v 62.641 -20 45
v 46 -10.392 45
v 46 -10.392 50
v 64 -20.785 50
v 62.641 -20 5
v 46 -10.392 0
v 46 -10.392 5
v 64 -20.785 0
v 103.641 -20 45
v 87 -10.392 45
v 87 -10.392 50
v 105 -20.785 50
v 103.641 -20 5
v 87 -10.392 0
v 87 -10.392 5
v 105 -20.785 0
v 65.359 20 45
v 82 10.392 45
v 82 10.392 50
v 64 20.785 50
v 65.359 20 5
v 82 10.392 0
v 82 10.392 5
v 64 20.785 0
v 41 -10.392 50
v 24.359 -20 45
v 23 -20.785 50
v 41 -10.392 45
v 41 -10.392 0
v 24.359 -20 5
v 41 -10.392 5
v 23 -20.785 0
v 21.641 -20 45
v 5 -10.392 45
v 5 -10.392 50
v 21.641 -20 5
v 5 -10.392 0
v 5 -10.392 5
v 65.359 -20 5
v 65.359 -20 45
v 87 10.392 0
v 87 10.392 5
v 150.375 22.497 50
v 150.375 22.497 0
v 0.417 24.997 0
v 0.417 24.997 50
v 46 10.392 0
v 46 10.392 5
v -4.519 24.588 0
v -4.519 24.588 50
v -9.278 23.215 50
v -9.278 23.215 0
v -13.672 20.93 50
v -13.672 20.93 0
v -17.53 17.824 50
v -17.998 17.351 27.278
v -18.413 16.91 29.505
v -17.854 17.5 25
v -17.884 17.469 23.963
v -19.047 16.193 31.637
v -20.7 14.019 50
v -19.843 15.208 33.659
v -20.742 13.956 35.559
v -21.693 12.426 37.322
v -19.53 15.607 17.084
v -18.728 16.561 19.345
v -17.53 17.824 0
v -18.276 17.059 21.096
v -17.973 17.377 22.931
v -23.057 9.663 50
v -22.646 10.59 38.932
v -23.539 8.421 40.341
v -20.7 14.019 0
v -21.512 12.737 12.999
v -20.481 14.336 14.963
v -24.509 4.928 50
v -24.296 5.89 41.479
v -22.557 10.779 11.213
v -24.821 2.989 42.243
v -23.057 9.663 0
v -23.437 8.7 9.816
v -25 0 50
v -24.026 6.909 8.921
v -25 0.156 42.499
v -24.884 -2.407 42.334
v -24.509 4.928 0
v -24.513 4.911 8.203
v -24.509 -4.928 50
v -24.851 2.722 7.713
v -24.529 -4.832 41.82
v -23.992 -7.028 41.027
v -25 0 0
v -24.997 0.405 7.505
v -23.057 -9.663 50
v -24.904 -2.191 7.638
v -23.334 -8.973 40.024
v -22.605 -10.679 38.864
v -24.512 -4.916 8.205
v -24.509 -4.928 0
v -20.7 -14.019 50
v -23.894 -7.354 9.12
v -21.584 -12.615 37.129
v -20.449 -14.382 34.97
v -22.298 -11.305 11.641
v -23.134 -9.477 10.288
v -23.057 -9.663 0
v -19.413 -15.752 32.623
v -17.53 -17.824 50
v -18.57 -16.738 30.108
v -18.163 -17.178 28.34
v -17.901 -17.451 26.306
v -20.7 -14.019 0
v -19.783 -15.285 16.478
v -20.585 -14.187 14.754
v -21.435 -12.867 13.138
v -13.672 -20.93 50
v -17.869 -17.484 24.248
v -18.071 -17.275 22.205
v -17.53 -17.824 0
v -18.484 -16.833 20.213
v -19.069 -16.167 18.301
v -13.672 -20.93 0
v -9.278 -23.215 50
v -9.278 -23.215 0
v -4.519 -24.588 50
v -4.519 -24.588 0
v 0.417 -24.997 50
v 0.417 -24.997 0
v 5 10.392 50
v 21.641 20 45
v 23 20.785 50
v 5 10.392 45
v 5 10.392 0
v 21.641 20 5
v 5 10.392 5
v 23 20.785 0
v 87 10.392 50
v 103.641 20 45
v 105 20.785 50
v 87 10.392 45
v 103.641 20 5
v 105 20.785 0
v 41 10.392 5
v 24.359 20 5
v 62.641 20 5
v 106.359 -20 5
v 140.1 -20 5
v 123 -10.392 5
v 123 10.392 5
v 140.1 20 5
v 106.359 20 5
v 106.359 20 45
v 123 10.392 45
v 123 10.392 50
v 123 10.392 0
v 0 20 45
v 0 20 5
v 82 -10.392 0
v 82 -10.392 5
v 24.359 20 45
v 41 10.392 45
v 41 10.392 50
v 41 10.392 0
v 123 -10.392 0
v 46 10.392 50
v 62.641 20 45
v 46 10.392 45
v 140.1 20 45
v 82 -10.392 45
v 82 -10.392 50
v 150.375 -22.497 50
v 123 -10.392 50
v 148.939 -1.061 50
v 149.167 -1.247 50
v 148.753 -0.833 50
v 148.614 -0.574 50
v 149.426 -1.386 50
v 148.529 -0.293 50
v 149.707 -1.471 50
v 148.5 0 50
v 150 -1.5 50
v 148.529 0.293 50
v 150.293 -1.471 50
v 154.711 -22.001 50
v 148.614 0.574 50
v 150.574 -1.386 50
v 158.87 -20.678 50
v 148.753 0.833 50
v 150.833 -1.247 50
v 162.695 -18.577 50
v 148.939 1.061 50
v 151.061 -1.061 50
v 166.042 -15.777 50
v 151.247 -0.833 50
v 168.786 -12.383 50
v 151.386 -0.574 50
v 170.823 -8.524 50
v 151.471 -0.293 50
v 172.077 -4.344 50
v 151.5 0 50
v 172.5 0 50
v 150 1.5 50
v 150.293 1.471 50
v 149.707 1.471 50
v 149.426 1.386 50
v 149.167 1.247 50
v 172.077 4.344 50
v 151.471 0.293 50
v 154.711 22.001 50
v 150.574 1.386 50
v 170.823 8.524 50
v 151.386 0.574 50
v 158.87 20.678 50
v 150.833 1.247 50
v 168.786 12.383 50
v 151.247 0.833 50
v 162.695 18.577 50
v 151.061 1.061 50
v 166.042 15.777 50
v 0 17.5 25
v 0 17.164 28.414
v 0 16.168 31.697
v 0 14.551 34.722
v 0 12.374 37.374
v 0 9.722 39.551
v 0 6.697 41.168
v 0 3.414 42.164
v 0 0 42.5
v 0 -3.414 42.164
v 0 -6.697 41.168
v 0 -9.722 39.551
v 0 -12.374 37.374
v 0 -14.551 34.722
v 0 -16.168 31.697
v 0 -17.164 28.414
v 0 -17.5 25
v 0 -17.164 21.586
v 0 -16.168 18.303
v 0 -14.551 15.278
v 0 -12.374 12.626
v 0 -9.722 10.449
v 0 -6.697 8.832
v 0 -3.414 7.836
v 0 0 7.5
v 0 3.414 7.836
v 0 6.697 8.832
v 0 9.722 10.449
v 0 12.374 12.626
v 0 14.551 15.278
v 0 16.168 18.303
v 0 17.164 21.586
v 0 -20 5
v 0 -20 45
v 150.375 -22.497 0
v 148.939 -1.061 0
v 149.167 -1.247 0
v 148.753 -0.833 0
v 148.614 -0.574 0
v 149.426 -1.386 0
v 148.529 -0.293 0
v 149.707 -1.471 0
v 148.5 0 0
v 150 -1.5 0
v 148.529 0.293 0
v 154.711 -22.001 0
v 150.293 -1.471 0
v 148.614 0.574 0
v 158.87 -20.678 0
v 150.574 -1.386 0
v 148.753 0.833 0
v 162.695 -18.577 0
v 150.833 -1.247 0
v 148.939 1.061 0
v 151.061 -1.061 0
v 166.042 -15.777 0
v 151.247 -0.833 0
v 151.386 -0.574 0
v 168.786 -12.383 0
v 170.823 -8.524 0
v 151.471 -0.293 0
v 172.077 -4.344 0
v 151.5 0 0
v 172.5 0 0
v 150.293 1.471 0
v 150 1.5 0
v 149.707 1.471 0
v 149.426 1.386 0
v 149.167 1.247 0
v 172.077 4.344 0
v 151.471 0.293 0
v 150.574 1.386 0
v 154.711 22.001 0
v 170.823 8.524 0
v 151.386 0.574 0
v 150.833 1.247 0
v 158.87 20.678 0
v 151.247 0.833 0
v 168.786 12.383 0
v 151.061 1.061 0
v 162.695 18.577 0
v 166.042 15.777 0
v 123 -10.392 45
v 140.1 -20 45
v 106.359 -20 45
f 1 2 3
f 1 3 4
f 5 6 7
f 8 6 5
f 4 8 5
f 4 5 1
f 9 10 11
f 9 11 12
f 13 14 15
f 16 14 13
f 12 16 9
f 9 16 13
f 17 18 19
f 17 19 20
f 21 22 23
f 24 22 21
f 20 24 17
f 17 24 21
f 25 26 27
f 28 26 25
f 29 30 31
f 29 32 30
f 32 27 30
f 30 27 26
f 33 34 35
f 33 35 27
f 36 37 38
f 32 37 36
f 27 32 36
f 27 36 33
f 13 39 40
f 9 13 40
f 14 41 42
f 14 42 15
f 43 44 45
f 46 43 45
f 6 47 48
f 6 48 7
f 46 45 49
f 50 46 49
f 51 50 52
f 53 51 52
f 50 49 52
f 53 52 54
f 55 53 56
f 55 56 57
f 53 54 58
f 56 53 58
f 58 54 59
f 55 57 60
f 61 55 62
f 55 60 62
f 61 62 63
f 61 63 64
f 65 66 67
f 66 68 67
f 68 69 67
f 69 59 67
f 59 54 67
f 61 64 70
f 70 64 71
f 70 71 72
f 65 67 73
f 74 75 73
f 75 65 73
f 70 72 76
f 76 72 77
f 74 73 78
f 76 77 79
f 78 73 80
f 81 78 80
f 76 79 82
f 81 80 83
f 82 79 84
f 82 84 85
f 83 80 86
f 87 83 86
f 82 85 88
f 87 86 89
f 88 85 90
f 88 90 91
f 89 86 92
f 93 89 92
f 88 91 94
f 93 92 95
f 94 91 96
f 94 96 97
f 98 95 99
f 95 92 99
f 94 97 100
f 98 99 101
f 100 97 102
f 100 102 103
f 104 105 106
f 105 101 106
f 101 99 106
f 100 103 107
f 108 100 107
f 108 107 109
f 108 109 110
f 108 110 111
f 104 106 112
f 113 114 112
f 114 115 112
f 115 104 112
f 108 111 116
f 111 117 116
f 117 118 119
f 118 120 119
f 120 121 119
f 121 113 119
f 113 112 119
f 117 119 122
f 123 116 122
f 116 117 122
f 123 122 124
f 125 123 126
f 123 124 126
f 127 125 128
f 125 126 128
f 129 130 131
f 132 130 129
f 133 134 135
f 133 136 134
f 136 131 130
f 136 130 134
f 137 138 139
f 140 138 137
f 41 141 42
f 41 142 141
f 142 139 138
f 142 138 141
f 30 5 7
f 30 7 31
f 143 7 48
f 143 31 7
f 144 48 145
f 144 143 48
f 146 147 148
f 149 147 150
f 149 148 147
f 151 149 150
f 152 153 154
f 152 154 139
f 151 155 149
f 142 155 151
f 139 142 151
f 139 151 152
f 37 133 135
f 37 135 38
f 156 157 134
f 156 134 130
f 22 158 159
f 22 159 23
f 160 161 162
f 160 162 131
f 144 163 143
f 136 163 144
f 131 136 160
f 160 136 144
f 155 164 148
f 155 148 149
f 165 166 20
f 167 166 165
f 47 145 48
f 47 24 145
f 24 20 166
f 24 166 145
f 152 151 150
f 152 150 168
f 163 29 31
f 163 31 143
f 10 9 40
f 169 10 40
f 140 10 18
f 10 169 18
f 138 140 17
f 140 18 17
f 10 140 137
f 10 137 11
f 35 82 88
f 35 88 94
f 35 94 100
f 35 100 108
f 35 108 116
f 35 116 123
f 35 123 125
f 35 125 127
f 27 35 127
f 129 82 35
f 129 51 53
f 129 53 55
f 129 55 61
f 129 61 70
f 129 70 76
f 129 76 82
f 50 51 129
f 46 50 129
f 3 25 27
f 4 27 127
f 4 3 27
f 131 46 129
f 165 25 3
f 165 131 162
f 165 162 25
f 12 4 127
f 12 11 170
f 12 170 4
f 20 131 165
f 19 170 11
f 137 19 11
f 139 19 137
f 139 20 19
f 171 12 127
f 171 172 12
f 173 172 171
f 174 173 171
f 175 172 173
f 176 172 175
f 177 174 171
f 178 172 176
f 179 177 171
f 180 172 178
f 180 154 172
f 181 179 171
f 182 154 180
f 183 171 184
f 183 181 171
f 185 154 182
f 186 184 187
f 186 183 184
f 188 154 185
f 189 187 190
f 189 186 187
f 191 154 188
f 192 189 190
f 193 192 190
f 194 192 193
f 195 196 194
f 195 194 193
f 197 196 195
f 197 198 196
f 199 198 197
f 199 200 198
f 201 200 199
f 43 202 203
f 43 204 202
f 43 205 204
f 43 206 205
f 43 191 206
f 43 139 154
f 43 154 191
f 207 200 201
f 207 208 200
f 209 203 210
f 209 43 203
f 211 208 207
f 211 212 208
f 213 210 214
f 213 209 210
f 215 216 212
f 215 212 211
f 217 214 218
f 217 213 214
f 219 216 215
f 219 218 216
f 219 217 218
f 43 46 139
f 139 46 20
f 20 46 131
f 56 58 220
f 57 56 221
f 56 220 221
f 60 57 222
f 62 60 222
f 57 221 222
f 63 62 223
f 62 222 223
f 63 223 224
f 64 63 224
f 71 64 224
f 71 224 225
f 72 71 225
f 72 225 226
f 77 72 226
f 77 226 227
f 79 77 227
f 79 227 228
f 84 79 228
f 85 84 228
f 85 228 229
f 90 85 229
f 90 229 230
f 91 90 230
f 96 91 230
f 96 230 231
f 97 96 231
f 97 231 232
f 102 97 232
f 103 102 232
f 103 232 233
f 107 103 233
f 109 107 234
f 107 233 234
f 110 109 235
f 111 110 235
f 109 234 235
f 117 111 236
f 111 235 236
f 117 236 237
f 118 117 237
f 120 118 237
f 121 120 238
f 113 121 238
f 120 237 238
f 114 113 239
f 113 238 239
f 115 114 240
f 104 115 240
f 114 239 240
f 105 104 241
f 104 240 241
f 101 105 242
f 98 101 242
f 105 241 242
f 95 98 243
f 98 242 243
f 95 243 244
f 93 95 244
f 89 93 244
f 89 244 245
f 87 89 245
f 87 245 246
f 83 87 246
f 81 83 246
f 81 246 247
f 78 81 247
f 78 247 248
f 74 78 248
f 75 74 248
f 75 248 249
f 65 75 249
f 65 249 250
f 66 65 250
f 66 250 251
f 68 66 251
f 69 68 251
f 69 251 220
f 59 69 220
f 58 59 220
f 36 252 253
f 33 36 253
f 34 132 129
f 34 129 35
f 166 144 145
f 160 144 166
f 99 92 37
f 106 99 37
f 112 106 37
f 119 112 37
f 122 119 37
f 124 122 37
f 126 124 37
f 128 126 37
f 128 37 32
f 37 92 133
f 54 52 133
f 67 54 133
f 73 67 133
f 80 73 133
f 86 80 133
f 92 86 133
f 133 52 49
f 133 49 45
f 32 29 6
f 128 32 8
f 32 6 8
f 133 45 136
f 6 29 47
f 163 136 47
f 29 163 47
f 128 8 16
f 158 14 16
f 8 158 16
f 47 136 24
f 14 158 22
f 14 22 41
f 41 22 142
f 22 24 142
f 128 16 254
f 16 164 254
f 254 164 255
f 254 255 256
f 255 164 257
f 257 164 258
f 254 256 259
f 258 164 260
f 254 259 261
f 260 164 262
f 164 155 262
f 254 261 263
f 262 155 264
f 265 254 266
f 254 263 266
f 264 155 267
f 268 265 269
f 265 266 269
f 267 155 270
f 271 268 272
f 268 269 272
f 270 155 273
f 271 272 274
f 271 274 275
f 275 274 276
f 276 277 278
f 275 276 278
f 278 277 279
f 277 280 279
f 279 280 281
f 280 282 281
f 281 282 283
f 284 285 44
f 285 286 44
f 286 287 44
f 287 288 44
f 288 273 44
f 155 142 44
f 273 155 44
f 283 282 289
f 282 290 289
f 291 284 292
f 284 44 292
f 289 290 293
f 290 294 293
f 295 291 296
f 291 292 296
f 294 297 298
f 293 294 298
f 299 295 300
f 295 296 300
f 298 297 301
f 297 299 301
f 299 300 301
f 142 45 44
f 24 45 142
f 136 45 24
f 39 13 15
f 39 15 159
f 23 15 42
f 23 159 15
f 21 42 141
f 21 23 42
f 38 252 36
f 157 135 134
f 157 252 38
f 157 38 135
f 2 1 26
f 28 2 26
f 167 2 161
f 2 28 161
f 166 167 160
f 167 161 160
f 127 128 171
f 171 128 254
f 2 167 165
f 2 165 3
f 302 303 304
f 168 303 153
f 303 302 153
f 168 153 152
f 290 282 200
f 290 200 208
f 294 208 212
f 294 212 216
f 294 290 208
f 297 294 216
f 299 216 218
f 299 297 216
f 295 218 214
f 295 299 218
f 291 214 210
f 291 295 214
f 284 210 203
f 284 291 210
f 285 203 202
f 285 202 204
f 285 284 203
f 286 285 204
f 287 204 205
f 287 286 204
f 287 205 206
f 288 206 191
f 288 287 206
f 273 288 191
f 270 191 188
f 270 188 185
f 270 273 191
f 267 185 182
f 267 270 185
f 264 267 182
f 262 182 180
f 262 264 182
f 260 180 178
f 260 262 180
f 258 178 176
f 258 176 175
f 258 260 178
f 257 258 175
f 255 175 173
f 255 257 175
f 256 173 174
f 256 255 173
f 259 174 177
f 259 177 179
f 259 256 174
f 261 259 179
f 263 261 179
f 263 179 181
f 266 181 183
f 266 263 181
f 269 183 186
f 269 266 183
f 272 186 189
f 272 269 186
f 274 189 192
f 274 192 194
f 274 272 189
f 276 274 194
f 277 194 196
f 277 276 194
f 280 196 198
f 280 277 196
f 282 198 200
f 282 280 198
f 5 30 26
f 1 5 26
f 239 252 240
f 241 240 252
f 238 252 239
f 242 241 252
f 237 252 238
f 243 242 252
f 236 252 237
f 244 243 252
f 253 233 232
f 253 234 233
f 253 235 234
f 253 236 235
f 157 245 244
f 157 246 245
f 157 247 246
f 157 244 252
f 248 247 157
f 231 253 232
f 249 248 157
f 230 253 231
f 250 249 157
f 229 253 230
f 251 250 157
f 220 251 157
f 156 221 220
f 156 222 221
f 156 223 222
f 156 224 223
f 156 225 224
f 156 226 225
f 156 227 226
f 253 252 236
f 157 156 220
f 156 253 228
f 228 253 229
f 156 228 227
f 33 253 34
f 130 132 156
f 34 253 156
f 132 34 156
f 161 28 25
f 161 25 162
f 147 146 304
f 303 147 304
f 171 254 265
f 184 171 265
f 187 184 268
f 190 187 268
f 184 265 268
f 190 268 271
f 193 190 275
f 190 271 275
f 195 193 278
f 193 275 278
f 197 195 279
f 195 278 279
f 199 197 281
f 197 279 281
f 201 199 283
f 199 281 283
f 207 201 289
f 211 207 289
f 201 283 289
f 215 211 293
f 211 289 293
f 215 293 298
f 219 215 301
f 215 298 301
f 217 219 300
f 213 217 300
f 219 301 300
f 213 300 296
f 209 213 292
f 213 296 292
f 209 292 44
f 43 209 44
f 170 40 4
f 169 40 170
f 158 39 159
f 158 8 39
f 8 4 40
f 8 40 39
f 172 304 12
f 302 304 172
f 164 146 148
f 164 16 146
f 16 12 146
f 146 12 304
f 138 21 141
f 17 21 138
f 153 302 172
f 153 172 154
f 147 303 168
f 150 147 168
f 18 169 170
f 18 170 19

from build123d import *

# Parameters (mm, degrees)
F0_R     = 1.5
F2_DEPTH = 50
F3_DEPTH = 60
F4_W     = 40
F4_H     = 40
F5_DEPTH = 140.1
F6_R     = 17.5
F7_DEPTH = 25.001


with BuildPart() as f2:
    # F0 (on Top) → F2 (new body)
    with BuildSketch(Plane.XY):
        with BuildLine():
            Line((150.375, 22.496875), (0.416667, 24.996528))
            ThreePointArc((0.416667, 24.996528), (-25, 0), (0.416667, -24.996528))
            Line((0.416667, -24.996528), (150.375, -22.496875))
            ThreePointArc((150.375, -22.496875), (172.5, 0), (150.375, 22.496875))
        make_face()
        with Locations((150, 0)):
            Circle(F0_R, mode=Mode.SUBTRACT)
    extrude(amount=F2_DEPTH)

    # F1 (on face) → F3 (cut)
    with BuildSketch(Plane.XY):
        Polygon((5, 10.392305), (5, -10.392305), (23, -20.784609), (41, -10.392305), (41, 10.392305), (23, 20.78461), align=None)
        Polygon((82, -10.392305), (82, 10.392305), (64, 20.78461), (46, 10.392305), (46, -10.392305), (64, -20.784609), align=None)
        Polygon((87, 10.392305), (87, -10.392305), (105, -20.784609), (123, -10.392305), (123, 10.392305), (105, 20.78461), align=None)
    extrude(amount=F3_DEPTH, mode=Mode.SUBTRACT)

    # F4 (on Right) → F5 (cut)
    with BuildSketch(Plane.YZ):
        with Locations((0, 25)):
            Rectangle(F4_W, F4_H)
    extrude(amount=F5_DEPTH, mode=Mode.SUBTRACT)

    # F6 (on Right) → F7 (cut, through all)
    with BuildSketch(Plane.YZ):
        with Locations((0, 25)):
            Circle(F6_R)
    extrude(amount=-F7_DEPTH, mode=Mode.SUBTRACT)


solid = f2.part
